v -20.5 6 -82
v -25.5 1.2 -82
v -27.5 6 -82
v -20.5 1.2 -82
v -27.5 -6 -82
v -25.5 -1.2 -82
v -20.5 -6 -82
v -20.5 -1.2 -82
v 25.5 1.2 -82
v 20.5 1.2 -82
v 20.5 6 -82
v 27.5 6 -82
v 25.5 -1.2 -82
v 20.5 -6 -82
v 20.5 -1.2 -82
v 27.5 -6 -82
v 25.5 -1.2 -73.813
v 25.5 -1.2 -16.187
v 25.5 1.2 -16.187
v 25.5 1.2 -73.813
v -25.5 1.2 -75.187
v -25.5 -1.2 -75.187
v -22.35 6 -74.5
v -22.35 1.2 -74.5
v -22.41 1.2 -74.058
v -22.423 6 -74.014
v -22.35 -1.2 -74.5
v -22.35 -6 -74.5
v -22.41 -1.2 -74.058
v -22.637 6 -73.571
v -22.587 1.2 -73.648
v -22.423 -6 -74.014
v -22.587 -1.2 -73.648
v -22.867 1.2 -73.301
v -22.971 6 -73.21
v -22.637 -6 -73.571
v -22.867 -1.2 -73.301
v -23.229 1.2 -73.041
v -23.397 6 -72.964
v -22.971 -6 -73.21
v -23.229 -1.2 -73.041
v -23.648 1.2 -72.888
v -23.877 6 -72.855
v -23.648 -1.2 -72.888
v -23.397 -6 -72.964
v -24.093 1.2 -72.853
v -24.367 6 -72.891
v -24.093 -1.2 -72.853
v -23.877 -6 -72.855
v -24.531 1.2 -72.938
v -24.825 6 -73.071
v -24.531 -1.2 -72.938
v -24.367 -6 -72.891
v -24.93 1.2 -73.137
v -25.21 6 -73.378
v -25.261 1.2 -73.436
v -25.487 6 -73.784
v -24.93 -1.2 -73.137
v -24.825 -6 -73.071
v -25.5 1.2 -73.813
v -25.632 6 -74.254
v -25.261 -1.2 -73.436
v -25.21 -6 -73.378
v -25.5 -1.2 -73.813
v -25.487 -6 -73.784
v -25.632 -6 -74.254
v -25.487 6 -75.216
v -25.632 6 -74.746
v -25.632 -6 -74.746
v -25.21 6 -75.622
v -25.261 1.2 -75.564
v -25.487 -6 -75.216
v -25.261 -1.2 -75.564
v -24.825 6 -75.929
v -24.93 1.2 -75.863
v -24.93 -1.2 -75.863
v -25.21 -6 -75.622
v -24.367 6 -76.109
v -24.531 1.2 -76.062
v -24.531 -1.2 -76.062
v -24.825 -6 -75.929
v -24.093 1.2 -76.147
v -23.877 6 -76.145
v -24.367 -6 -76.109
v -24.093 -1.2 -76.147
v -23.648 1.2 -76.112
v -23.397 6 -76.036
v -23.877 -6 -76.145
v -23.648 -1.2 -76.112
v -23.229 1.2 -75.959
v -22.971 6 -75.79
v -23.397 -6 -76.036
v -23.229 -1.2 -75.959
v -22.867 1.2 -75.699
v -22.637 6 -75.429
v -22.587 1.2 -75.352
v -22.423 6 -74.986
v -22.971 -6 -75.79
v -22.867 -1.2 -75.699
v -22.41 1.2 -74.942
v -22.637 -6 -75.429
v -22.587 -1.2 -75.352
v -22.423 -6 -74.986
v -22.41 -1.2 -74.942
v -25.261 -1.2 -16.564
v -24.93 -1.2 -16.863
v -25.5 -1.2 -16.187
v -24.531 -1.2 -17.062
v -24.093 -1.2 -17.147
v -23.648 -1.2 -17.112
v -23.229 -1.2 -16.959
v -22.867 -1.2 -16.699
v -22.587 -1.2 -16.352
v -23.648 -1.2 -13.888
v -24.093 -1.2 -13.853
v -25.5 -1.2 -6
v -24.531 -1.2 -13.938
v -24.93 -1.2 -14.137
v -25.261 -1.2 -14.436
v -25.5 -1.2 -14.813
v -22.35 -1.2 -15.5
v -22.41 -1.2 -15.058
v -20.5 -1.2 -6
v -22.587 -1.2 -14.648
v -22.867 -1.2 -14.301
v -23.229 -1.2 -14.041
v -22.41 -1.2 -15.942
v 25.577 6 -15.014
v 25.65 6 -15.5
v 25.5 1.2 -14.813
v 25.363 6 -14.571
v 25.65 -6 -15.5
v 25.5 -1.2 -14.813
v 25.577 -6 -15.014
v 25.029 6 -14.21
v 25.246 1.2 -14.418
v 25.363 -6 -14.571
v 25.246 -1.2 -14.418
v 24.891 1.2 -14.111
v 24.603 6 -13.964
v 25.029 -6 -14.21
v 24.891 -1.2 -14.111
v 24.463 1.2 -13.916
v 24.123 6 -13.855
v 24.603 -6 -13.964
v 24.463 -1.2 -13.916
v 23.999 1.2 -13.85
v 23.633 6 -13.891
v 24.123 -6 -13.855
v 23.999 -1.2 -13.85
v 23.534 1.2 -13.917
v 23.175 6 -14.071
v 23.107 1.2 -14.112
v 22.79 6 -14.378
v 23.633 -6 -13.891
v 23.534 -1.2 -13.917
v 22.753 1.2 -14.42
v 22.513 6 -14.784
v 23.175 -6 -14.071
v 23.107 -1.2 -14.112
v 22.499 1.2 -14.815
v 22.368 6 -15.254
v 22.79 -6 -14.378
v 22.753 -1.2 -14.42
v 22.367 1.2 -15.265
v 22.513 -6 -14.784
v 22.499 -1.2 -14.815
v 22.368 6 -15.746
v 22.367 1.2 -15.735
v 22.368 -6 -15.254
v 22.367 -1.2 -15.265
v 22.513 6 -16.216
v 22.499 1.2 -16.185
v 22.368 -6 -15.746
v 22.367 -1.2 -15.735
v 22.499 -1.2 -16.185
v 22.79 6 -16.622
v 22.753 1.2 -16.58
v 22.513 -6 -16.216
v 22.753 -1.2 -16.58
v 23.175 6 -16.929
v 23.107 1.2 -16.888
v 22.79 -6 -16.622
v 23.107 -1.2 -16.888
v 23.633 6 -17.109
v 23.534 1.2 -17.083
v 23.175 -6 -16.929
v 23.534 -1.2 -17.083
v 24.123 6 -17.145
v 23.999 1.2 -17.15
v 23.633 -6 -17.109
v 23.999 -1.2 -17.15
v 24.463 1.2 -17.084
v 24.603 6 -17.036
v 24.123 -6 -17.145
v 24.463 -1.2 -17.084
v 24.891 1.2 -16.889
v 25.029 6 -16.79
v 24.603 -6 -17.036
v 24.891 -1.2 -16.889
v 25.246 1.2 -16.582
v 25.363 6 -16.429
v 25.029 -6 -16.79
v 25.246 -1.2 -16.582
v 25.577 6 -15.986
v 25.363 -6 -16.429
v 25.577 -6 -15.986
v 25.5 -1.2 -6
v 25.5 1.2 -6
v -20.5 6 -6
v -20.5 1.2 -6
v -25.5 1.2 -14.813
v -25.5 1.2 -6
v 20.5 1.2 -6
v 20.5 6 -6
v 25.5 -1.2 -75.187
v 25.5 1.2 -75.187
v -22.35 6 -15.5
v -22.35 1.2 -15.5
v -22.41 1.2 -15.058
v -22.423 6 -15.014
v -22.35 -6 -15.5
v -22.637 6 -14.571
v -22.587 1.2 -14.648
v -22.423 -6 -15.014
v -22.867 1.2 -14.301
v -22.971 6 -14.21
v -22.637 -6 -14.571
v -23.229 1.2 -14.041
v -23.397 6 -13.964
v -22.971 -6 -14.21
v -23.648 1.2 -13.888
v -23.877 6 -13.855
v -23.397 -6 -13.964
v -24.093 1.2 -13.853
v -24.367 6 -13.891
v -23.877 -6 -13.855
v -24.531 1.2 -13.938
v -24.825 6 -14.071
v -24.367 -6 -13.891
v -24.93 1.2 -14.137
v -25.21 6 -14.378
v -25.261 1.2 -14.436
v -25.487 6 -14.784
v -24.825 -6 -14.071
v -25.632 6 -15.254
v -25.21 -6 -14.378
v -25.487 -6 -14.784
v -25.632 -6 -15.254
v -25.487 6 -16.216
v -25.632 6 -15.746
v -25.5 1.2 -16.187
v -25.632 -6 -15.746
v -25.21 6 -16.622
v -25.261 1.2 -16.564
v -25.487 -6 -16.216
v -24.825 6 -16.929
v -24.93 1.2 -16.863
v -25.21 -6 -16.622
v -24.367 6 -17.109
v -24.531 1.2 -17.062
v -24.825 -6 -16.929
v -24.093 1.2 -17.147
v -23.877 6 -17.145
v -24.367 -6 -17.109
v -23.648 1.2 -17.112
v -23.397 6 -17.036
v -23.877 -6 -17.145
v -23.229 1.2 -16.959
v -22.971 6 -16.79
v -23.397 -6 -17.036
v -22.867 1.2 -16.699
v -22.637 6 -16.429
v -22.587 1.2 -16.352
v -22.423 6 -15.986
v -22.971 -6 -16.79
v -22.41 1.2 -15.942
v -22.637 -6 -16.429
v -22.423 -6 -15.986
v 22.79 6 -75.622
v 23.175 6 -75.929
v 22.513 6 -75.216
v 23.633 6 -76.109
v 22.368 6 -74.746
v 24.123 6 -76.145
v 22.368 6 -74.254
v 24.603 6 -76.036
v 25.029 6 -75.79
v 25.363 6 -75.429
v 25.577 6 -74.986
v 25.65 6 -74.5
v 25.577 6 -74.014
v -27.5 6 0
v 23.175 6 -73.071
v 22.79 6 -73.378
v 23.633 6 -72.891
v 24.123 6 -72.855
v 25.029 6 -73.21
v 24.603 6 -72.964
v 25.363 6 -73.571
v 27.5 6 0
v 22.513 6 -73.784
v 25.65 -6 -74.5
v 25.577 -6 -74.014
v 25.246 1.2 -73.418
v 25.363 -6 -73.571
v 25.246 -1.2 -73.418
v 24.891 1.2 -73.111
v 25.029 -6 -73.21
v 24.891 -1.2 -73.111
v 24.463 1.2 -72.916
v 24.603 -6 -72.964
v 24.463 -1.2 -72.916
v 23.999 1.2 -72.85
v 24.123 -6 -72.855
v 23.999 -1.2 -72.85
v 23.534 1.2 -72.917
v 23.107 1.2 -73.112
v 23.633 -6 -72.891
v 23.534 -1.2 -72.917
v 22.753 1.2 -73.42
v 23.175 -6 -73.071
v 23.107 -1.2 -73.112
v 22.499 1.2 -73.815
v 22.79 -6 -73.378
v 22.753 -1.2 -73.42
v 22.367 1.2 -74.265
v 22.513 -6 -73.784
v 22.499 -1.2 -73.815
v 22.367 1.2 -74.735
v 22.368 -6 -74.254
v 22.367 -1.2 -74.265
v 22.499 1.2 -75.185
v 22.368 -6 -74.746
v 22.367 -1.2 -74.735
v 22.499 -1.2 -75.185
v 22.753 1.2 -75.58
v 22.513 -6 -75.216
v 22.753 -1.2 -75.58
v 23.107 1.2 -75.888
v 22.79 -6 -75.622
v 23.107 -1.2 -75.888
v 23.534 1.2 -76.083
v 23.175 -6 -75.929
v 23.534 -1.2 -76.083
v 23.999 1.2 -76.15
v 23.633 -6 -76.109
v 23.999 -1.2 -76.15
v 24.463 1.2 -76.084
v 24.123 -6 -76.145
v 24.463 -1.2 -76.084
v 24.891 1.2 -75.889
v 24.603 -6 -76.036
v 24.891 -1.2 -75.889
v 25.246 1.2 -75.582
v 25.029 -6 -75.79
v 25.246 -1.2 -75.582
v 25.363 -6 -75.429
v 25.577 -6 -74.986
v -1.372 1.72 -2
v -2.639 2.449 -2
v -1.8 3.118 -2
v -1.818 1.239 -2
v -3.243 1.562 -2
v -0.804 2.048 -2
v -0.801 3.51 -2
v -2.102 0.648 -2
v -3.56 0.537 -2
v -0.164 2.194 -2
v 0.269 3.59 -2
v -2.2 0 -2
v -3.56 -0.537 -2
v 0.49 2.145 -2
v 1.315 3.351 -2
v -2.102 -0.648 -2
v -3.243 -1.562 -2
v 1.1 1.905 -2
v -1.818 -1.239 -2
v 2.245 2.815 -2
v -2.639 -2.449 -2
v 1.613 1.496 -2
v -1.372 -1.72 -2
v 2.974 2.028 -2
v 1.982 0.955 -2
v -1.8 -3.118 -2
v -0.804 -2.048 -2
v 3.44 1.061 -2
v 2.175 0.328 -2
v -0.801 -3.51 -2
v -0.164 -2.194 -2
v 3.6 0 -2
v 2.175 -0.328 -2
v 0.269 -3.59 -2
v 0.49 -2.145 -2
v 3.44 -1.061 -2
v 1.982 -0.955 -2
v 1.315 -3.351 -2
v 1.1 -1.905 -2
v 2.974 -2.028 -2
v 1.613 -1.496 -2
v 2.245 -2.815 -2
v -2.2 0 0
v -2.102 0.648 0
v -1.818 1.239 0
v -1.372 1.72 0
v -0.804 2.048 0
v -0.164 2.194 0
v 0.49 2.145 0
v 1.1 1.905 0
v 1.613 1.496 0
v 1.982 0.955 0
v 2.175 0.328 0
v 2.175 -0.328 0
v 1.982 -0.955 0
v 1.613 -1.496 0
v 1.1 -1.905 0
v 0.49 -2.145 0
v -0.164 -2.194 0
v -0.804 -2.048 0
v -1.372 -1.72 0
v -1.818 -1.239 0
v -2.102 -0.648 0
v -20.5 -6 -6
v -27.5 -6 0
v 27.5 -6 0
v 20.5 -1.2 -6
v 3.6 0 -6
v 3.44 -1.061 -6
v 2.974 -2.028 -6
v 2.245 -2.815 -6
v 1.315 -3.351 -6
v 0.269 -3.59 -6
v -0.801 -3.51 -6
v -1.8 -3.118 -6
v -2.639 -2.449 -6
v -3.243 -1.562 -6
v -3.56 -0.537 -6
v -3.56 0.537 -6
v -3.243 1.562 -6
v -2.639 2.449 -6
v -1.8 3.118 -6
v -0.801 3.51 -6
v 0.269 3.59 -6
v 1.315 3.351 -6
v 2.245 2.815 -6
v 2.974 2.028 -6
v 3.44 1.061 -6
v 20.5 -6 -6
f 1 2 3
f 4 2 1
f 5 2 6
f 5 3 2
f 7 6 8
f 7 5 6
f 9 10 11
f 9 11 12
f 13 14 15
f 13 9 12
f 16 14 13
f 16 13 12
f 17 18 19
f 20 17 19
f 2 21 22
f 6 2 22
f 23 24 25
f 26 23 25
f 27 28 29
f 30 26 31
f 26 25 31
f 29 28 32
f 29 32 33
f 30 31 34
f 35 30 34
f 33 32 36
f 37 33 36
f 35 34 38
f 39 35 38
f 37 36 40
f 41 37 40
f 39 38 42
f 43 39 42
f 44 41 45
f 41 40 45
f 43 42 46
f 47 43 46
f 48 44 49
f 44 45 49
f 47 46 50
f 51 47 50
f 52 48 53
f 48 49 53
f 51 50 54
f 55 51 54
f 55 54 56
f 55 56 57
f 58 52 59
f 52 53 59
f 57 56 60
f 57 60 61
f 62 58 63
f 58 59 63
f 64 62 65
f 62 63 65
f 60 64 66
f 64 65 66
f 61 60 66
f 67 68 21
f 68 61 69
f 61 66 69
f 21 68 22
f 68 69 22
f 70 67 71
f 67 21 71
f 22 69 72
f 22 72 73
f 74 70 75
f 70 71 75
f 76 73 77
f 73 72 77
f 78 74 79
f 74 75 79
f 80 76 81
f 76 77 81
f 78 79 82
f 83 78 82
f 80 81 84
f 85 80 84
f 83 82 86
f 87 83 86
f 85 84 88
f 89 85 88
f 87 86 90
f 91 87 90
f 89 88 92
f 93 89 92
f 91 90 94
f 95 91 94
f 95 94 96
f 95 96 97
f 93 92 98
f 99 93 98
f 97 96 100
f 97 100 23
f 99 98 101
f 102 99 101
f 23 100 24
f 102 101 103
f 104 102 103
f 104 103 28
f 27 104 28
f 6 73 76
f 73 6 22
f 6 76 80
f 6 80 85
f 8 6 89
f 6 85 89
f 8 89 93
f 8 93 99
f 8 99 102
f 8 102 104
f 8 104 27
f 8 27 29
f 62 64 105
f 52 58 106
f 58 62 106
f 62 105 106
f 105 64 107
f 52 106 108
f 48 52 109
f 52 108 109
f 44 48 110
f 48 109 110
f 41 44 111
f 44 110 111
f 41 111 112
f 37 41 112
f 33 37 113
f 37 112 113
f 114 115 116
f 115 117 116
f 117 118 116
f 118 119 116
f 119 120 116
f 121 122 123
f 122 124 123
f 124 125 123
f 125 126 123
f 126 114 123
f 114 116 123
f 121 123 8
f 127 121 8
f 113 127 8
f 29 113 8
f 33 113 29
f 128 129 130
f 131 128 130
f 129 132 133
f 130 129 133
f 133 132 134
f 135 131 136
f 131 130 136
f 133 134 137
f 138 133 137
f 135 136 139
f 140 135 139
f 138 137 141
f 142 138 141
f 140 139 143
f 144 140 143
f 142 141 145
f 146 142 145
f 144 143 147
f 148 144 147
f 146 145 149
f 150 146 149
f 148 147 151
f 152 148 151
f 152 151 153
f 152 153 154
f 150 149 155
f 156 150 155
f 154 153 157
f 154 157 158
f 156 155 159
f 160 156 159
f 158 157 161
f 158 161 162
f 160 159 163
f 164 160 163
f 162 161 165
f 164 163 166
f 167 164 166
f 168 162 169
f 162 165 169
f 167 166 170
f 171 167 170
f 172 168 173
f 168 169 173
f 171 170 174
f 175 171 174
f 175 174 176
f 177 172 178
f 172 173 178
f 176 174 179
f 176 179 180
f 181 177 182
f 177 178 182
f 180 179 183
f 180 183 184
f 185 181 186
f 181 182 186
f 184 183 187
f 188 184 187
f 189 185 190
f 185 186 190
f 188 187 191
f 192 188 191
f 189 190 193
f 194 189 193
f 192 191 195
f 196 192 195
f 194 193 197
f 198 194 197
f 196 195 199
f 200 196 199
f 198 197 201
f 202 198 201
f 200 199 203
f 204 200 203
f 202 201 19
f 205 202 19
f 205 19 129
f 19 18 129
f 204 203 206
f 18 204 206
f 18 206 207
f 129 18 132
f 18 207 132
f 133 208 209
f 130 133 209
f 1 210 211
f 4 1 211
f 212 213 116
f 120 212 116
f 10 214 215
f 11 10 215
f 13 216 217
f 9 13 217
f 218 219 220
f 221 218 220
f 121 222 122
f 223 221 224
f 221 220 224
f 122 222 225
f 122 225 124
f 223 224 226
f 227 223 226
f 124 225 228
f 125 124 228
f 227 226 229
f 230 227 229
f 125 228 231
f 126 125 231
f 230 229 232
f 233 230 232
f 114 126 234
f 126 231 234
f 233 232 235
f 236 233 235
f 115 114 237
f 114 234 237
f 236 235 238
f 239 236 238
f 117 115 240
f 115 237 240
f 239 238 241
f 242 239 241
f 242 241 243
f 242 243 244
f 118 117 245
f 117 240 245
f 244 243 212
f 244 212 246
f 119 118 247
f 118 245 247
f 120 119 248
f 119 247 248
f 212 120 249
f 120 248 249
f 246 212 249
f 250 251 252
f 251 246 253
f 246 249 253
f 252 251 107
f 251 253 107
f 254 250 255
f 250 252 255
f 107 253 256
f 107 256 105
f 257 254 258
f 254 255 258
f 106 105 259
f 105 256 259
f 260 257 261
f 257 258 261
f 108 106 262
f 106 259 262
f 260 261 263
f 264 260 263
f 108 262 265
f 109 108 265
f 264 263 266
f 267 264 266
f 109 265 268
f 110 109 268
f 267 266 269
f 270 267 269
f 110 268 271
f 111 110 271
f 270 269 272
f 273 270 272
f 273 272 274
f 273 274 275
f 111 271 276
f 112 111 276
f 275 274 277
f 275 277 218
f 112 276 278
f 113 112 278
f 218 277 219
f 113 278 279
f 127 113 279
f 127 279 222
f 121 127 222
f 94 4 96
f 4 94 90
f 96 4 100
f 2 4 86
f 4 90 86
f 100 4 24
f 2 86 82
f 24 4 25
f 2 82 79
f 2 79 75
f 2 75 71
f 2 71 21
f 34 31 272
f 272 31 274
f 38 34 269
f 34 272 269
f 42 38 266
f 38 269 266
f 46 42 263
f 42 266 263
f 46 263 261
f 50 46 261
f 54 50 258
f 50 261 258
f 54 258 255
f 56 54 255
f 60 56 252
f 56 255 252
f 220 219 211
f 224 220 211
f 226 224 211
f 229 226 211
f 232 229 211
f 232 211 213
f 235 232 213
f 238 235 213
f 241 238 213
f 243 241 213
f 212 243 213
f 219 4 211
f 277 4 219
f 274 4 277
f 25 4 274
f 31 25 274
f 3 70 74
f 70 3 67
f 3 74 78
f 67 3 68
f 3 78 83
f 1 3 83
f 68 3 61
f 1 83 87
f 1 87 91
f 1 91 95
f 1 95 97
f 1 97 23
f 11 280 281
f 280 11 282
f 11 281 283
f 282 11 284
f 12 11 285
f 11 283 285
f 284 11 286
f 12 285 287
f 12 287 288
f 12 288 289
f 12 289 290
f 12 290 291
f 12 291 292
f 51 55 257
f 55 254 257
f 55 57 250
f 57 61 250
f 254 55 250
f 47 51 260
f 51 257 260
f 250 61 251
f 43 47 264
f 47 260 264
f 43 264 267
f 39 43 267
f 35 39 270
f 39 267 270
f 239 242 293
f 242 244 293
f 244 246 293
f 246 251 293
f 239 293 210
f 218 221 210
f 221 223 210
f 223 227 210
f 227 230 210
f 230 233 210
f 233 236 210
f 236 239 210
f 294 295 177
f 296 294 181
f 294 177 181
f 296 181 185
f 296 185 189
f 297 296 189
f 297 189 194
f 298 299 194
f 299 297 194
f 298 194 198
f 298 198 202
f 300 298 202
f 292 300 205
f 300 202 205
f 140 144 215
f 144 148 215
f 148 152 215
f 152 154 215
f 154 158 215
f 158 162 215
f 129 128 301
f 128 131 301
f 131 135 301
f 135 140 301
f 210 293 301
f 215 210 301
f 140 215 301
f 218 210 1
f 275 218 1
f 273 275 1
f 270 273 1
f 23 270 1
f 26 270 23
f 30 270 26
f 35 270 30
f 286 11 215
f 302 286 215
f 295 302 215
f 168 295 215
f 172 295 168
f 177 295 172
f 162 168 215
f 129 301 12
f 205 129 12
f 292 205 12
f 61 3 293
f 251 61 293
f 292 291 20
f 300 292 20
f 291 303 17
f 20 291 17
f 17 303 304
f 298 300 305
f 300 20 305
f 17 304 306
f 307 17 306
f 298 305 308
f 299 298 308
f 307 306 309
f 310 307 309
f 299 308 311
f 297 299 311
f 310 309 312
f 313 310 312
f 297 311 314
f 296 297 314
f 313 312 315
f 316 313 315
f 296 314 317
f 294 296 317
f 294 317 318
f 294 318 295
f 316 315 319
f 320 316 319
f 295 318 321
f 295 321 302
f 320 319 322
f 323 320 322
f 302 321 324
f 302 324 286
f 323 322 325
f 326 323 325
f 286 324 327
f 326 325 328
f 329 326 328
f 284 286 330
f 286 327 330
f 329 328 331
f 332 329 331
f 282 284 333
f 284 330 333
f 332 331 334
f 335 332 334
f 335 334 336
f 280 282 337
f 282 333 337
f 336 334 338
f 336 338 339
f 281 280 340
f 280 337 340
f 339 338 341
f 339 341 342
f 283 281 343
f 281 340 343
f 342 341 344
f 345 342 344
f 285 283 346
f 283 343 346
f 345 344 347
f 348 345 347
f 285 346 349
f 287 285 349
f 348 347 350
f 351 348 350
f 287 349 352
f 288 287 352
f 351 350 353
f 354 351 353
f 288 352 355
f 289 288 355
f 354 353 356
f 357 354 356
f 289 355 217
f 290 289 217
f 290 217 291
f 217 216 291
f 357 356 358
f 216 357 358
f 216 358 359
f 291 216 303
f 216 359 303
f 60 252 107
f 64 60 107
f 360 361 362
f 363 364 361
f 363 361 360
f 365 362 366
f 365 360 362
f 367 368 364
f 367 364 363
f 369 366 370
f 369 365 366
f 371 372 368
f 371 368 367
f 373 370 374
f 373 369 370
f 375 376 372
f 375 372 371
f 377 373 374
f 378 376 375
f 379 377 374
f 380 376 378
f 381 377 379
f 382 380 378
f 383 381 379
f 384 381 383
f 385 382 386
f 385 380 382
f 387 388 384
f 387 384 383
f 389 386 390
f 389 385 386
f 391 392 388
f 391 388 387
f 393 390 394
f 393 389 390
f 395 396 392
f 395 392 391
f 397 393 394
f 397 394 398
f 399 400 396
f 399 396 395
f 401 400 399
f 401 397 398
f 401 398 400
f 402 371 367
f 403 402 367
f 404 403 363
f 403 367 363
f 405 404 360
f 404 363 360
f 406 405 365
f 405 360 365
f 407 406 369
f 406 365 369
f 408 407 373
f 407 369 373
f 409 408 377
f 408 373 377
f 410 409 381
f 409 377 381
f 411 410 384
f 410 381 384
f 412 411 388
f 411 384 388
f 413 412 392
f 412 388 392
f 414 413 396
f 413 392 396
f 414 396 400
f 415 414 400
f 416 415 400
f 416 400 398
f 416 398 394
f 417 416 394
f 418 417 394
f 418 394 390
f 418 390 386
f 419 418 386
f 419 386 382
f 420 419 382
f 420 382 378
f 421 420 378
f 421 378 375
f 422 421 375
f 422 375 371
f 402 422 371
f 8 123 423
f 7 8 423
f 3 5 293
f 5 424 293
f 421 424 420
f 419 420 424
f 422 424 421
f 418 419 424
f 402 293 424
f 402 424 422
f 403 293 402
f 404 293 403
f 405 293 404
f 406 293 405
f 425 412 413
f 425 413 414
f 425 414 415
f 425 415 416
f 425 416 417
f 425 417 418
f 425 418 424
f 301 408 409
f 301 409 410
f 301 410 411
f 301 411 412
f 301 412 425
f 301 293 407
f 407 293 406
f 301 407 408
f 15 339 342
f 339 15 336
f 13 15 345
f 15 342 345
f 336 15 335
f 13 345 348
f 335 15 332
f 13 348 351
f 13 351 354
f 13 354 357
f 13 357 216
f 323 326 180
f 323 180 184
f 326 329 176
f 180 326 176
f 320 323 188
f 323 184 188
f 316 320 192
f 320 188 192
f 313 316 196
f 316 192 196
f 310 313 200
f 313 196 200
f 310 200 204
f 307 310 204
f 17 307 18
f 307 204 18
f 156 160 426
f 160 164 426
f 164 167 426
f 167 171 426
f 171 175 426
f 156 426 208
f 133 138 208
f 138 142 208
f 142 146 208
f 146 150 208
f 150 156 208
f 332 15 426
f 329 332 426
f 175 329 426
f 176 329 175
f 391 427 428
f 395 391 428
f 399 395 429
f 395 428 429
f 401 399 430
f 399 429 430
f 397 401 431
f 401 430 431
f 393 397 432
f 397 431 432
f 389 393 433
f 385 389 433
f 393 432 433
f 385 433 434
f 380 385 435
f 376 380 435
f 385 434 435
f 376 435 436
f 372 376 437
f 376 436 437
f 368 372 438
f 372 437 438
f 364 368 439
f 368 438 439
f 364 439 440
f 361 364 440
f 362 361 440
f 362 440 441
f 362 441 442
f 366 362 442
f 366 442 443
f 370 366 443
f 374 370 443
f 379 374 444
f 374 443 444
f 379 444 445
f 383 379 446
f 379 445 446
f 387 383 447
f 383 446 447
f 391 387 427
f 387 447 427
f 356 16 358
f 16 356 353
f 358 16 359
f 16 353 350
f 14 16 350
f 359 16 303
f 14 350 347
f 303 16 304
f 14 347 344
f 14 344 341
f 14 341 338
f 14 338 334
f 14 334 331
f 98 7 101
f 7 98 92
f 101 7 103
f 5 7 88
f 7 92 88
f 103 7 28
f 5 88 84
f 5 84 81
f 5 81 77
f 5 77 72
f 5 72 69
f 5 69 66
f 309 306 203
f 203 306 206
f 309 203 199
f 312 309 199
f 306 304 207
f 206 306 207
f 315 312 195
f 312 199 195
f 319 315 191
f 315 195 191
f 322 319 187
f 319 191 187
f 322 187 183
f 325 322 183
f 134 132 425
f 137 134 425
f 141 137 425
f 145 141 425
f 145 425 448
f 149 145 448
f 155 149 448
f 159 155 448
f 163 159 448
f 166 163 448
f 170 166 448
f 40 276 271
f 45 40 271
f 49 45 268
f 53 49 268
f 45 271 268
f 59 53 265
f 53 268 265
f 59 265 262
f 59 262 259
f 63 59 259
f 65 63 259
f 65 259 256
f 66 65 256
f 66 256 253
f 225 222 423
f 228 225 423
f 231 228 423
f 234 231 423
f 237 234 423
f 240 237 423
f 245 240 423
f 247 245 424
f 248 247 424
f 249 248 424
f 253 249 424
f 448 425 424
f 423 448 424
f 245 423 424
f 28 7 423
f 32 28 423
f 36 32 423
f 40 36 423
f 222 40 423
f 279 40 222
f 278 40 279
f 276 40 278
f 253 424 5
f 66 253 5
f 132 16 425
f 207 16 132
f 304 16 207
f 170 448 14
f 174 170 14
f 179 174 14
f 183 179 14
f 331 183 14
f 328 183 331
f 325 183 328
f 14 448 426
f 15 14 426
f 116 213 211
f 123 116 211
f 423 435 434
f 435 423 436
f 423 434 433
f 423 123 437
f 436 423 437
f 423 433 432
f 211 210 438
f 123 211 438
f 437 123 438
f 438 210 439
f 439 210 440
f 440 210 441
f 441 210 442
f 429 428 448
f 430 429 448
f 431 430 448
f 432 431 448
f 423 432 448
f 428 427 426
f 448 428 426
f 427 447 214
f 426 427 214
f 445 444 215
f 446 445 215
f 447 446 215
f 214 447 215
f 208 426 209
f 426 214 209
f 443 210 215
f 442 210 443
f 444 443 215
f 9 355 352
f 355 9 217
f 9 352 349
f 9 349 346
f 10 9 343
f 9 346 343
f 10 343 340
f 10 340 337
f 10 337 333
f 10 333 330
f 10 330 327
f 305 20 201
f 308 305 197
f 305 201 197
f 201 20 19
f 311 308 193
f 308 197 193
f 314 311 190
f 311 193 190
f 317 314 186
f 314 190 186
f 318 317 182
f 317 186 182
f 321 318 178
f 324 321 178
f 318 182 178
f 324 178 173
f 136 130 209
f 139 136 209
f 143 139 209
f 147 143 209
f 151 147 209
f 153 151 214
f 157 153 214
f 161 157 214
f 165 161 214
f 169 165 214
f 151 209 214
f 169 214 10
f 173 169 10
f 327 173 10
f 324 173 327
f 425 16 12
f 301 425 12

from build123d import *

# Parameters (mm, degrees)
F0_W      = 55
F0_H      = 12
F1_DEPTH  = 6
F2_D      = 4.4
F4_DEPTH  = 76
F6_D      = 3.3
F7_D      = 3.3
F8_D      = 3.3
F9_D      = 3.3
F10_R     = 3.6
F10_R_2   = 2.2
F11_DEPTH = 4


with BuildPart() as f1:
    # F0 (on Top) → F1 (new body)
    with BuildSketch(Plane.XY):
        Rectangle(F0_W, F0_H)
    extrude(amount=-F1_DEPTH)

    # F2 (through all)
    with Locations(Plane.XY):
        with Locations((0, 0)):
            Hole(F2_D / 2)

    # F3 (on face) → F4 (join)
    with BuildSketch(Plane(origin=(0, 0, -6), x_dir=(1, 0, 0), z_dir=(0, 0, -1))):
        Polygon((-20.5, 6), (-27.5, 6), (-27.5, -6), (-20.5, -6), (-20.5, -1.2), (-25.5, -1.2), (-25.5, 1.2), (-20.5, 1.2), align=None)
        Polygon((27.5, 6), (20.5, 6), (20.5, 1.2), (25.5, 1.2), (25.5, -1.2), (20.5, -1.2), (20.5, -6), (27.5, -6), align=None)
    extrude(amount=F4_DEPTH)

    # F6 (through all)
    with Locations(Plane(origin=(0, 6, 0), x_dir=(-1, 0, 0), z_dir=(0, 1, 0))):
        with Locations((24, -74.5)):
            Hole(F6_D / 2)

    # F7 (through all)
    with Locations(Plane(origin=(0, 6, 0), x_dir=(-1, 0, 0), z_dir=(0, 1, 0))):
        with Locations((-24, -74.5)):
            Hole(F7_D / 2)

    # F8 (through all)
    with Locations(Plane(origin=(0, 6, 0), x_dir=(-1, 0, 0), z_dir=(0, 1, 0))):
        with Locations((24, -15.5)):
            Hole(F8_D / 2)

    # F9 (through all)
    with Locations(Plane(origin=(0, 6, 0), x_dir=(-1, 0, 0), z_dir=(0, 1, 0))):
        with Locations((-24, -15.5)):
            Hole(F9_D / 2)

    # F10 (on face) → F11 (cut)
    with BuildSketch(Plane(origin=(0, 0, -6), x_dir=(1, 0, 0), z_dir=(0, 0, -1))):
        Circle(F10_R)
        Circle(F10_R_2, mode=Mode.SUBTRACT)
    extrude(amount=-F11_DEPTH, mode=Mode.SUBTRACT)


solid = f1.part
